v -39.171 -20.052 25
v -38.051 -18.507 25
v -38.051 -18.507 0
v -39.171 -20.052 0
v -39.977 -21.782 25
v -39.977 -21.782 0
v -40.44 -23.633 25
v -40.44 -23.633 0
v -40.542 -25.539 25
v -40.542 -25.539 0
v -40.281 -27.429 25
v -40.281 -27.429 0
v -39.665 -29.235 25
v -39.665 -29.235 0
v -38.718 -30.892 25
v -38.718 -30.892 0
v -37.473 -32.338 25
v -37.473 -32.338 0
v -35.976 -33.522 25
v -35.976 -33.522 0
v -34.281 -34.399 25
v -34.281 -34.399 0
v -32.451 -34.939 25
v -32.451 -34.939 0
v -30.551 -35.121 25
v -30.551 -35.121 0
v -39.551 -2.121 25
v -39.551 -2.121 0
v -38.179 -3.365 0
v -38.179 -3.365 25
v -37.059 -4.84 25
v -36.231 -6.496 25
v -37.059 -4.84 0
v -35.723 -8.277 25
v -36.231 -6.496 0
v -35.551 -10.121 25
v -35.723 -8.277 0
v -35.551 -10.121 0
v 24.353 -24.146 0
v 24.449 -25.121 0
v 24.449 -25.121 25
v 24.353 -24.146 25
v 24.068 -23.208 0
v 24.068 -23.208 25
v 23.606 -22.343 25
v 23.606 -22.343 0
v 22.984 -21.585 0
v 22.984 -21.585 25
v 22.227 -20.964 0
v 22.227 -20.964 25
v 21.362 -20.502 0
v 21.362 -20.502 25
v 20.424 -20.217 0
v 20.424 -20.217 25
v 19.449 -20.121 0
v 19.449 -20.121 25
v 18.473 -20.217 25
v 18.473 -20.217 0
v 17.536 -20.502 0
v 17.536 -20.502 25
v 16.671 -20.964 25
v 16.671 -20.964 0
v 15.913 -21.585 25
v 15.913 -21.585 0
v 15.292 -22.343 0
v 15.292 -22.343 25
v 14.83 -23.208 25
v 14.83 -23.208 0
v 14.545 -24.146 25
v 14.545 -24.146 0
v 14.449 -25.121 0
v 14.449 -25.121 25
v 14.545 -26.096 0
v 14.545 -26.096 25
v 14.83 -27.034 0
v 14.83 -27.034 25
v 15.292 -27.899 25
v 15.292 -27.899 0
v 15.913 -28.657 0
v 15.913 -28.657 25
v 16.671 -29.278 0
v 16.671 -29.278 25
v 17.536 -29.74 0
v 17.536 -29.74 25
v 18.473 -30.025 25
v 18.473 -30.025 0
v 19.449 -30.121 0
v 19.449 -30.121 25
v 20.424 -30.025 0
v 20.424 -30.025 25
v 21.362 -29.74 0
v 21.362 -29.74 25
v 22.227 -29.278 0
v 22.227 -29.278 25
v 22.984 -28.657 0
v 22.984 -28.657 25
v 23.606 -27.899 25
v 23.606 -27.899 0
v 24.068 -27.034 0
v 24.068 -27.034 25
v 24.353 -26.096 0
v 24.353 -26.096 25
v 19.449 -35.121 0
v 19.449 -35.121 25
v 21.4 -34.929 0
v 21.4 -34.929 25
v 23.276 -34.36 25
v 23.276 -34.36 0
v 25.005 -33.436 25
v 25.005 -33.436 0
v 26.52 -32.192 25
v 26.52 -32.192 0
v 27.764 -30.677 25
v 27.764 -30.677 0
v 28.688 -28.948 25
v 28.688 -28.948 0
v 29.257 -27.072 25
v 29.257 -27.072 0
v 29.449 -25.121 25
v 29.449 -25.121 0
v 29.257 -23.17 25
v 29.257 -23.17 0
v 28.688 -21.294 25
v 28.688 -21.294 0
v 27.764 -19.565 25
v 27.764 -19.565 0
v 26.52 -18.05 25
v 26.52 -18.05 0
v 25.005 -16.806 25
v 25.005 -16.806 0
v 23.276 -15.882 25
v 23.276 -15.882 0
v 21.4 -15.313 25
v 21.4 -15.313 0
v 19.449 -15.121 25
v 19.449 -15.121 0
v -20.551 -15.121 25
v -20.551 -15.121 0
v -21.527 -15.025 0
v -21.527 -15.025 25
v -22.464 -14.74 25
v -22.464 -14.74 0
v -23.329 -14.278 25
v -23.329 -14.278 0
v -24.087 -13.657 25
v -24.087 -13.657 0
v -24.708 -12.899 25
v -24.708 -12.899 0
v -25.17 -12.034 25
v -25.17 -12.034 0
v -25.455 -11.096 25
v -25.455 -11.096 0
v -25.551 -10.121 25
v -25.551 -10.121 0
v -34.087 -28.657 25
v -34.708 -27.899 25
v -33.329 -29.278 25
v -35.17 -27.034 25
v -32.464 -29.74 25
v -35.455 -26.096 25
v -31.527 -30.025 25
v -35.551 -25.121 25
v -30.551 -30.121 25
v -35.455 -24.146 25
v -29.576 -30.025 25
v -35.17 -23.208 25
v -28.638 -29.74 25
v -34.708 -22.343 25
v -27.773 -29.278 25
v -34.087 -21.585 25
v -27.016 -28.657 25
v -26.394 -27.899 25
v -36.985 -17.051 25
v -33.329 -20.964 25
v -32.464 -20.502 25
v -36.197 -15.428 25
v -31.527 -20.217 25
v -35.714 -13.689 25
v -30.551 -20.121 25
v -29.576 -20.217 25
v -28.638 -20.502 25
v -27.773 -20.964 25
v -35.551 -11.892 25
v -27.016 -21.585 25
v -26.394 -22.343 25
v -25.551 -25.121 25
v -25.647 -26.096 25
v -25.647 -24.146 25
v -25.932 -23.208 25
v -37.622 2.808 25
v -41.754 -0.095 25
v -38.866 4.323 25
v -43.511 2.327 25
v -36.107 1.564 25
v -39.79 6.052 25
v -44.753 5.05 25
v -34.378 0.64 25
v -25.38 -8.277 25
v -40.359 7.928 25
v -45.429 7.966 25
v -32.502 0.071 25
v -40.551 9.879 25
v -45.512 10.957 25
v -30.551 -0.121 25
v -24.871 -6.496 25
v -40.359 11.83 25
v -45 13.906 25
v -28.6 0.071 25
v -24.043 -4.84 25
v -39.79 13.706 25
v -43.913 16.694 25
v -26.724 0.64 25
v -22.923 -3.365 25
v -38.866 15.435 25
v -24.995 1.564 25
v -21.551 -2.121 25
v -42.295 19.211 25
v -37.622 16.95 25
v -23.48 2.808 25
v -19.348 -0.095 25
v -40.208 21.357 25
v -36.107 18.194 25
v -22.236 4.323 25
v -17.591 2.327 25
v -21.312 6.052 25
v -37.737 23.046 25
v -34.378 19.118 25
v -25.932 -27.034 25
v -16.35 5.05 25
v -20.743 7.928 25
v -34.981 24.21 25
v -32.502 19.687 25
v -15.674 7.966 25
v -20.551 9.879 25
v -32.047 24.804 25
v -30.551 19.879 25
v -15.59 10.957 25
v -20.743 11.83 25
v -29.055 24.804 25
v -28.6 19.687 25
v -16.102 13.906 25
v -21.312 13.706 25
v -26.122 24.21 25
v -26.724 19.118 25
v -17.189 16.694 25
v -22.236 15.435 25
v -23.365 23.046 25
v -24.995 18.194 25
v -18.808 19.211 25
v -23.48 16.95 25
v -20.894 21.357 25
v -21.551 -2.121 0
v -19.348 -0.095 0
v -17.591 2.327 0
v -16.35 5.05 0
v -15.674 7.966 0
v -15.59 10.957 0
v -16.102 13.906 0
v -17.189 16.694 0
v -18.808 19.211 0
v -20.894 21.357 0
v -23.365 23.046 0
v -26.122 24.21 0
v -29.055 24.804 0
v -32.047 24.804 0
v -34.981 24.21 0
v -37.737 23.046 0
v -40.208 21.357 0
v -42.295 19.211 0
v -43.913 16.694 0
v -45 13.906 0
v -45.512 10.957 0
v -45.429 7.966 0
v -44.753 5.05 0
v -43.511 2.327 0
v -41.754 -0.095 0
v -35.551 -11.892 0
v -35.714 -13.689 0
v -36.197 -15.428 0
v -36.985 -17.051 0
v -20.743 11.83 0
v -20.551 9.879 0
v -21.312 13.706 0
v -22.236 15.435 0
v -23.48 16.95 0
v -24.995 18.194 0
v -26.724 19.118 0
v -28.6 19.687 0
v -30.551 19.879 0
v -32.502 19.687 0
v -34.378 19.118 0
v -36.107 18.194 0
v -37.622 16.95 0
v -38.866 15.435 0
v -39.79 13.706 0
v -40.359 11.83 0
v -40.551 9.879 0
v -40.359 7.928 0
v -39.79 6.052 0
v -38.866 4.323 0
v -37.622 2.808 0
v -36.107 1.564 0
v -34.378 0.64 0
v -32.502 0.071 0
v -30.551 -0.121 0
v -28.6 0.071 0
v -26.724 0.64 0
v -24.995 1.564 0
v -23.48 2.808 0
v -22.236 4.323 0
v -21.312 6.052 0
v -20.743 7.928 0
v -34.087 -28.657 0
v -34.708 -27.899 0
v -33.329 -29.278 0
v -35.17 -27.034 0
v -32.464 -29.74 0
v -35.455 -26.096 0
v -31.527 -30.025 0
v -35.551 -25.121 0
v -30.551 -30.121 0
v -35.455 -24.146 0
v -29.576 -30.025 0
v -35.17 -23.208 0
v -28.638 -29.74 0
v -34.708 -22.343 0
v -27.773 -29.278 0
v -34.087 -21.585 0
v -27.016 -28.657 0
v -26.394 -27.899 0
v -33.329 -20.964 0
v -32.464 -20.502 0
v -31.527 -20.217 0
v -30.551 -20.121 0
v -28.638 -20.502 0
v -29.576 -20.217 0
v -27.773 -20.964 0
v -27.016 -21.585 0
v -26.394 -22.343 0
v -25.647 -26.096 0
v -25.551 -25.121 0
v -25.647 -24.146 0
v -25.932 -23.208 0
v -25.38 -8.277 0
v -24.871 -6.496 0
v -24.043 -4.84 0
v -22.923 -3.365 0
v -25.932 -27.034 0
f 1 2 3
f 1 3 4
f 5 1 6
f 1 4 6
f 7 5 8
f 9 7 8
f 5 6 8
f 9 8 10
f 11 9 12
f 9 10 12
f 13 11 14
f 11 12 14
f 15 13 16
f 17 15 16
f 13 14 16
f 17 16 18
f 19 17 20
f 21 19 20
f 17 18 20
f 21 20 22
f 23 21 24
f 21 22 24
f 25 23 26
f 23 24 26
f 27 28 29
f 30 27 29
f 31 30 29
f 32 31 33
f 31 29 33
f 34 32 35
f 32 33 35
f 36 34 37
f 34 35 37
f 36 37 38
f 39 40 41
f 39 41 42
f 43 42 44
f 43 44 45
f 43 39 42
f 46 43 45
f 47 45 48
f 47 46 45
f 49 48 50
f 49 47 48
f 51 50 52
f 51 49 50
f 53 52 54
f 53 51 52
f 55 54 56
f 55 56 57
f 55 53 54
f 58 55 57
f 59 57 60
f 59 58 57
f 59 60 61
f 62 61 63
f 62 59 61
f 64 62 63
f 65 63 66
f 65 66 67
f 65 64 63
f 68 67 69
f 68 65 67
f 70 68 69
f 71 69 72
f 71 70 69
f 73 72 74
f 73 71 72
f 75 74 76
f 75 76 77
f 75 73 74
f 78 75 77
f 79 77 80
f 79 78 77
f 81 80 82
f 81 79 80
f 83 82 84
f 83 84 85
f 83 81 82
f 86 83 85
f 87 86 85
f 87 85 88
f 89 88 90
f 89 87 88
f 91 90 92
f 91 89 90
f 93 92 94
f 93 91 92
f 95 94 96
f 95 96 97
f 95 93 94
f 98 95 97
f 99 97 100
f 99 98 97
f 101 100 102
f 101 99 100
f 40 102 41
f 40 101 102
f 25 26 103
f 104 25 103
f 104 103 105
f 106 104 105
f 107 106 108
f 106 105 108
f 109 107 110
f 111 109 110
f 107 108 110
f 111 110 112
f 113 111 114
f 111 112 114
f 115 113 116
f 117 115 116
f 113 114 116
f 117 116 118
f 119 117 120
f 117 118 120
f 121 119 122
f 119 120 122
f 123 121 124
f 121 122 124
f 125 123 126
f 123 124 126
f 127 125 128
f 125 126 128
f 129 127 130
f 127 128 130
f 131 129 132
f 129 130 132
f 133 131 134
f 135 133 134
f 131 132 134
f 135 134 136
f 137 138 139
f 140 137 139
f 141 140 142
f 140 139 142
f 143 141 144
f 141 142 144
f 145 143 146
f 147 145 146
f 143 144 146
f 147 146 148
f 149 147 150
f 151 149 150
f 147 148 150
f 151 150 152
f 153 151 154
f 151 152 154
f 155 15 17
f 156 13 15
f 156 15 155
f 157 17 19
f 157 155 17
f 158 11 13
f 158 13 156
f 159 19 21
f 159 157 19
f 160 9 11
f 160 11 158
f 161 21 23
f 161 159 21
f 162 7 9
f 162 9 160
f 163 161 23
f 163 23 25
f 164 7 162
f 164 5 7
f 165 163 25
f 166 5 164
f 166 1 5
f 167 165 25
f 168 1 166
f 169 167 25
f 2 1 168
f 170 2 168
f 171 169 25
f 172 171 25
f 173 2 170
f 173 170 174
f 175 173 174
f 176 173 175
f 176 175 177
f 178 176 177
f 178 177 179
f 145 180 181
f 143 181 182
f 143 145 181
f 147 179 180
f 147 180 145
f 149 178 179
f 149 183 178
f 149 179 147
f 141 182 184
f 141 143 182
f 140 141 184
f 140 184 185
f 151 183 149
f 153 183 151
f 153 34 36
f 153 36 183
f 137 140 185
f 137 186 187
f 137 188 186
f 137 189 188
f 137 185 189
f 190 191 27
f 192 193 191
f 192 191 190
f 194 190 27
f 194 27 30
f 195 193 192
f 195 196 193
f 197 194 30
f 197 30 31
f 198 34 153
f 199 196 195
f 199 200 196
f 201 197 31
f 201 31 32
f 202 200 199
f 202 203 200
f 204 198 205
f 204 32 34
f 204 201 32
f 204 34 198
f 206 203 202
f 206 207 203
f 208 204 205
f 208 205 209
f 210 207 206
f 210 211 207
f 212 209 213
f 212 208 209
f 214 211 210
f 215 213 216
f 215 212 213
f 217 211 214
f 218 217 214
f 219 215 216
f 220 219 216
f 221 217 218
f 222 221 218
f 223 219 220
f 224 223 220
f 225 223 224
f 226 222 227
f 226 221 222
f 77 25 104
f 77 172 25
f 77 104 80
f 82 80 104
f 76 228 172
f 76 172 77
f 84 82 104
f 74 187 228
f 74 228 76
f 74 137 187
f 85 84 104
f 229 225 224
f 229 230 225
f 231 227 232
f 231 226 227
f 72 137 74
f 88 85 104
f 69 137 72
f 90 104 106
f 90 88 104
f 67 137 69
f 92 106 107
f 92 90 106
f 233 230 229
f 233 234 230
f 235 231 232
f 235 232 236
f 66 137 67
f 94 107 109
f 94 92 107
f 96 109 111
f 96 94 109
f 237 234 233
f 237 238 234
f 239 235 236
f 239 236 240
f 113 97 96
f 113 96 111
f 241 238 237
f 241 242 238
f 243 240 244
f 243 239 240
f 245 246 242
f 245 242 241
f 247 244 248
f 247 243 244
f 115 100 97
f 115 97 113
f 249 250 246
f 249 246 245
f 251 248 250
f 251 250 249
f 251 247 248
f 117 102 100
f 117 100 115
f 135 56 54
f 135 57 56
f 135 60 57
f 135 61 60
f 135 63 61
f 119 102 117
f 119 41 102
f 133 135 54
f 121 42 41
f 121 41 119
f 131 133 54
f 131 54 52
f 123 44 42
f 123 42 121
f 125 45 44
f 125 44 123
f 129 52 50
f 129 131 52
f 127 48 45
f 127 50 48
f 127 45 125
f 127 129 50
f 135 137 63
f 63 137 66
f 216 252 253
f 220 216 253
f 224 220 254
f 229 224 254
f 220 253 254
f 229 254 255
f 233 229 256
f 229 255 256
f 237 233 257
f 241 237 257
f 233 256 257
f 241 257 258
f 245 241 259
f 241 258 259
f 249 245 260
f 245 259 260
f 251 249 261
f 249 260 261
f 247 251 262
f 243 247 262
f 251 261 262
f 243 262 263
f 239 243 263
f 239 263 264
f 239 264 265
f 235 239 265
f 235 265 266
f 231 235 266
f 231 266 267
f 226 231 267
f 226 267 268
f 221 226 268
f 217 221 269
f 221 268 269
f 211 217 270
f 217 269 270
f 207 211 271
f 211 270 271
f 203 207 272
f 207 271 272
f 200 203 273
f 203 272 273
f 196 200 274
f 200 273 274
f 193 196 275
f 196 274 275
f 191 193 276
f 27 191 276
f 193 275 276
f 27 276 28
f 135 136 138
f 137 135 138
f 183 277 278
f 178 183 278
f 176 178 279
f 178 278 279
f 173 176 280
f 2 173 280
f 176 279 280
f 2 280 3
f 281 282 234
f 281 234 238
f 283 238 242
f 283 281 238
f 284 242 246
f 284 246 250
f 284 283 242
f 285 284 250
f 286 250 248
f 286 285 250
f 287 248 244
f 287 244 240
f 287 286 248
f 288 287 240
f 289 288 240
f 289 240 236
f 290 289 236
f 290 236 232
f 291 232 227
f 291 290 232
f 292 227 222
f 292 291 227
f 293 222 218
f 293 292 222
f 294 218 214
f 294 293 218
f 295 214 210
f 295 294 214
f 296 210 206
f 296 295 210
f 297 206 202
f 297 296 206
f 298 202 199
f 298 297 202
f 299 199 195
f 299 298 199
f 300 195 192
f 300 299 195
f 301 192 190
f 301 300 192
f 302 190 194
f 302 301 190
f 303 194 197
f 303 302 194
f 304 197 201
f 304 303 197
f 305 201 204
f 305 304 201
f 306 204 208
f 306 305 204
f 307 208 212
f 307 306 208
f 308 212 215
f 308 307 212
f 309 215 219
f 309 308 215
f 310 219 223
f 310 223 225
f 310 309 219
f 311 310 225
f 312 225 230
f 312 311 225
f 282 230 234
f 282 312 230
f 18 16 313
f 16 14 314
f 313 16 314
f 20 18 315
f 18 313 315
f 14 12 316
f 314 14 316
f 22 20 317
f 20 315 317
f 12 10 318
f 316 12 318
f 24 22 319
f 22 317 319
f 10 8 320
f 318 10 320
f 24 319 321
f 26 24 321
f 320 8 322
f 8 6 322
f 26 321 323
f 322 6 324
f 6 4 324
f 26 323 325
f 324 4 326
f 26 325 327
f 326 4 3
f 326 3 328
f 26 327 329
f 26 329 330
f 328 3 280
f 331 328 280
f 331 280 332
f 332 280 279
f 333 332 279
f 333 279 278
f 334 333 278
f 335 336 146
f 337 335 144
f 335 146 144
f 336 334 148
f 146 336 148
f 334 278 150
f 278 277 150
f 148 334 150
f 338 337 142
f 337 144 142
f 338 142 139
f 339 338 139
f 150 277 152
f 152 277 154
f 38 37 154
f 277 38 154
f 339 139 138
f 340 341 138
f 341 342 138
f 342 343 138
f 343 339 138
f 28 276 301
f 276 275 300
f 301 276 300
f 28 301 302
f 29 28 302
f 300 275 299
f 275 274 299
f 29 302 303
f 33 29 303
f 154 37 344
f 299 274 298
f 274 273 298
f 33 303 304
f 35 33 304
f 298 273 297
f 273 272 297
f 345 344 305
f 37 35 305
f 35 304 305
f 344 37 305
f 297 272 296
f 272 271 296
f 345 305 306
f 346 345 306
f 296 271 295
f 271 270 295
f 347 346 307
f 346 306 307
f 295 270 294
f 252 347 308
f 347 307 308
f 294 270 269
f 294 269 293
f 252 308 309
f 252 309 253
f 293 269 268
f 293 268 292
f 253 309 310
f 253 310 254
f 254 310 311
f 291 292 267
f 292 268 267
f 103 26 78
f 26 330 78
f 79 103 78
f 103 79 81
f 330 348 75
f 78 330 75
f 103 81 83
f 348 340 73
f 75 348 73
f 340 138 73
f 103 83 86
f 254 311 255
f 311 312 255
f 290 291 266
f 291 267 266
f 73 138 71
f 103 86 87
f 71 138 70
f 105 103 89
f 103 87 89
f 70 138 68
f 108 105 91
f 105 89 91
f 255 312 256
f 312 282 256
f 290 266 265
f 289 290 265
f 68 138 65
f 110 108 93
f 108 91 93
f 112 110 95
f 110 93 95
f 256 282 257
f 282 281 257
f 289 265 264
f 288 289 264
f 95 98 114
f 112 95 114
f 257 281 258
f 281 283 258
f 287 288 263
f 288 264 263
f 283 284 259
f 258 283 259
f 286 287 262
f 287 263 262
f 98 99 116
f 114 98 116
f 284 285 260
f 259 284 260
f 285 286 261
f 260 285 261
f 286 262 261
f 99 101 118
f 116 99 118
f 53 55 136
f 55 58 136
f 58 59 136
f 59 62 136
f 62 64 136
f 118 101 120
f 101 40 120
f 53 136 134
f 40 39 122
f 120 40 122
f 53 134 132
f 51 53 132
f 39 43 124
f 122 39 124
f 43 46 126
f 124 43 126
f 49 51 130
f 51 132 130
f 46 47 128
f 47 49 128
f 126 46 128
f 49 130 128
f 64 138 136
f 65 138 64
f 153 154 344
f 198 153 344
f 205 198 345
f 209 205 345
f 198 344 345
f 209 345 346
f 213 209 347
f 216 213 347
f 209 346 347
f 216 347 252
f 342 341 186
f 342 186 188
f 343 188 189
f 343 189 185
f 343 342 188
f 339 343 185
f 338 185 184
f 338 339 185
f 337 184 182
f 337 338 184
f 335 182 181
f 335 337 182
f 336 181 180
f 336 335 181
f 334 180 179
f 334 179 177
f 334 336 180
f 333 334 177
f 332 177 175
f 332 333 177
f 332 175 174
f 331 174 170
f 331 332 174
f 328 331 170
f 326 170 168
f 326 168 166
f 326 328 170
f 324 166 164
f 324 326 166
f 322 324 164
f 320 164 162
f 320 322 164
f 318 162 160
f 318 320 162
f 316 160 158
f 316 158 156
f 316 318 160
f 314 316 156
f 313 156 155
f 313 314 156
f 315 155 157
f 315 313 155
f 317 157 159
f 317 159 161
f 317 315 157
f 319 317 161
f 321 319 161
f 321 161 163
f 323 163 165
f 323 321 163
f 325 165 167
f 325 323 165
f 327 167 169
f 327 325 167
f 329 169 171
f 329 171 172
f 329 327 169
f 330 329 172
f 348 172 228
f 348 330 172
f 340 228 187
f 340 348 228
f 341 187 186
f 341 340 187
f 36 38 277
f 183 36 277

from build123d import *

# Parameters (mm, degrees)
F0_R     = 5
F0_R_2   = 10
F1_DEPTH = 25


with BuildPart() as f1:
    # F0 (on Top) → F1 (new body)
    with BuildSketch(Plane.XY):
        with BuildLine():
            Line((-30.551076, -35.12097), (19.448924, -35.12097))
            ThreePointArc((19.448924, -35.12097), (29.448924, -25.12097), (19.448924, -15.12097))
            Line((19.448924, -15.12097), (-20.551076, -15.12097))
            ThreePointArc((-20.551076, -15.12097), (-24.086609, -13.656504), (-25.551076, -10.12097))
            ThreePointArc((-25.551076, -10.12097), (-24.495347, -5.648834), (-21.551076, -2.12097))
            ThreePointArc((-21.551076, -2.12097), (-30.551076, 24.87903), (-39.551076, -2.12097))
            ThreePointArc((-39.551076, -2.12097), (-36.606804, -5.648834), (-35.551076, -10.12097))
            Line((-35.551076, -10.12097), (-35.551076, -11.892213))
            ThreePointArc((-35.551076, -11.892213), (-36.196932, -15.427747), (-38.051076, -18.506592))
            ThreePointArc((-38.051076, -18.506592), (-39.665454, -29.235348), (-30.551076, -35.12097))
        make_face()
        with Locations((-30.551076, -25.12097)):
            Circle(F0_R, mode=Mode.SUBTRACT)
        with Locations((19.448924, -25.12097)):
            Circle(F0_R, mode=Mode.SUBTRACT)
        with Locations((-30.551076, 9.87903)):
            Circle(F0_R_2, mode=Mode.SUBTRACT)
    extrude(amount=F1_DEPTH)


solid = f1.part
